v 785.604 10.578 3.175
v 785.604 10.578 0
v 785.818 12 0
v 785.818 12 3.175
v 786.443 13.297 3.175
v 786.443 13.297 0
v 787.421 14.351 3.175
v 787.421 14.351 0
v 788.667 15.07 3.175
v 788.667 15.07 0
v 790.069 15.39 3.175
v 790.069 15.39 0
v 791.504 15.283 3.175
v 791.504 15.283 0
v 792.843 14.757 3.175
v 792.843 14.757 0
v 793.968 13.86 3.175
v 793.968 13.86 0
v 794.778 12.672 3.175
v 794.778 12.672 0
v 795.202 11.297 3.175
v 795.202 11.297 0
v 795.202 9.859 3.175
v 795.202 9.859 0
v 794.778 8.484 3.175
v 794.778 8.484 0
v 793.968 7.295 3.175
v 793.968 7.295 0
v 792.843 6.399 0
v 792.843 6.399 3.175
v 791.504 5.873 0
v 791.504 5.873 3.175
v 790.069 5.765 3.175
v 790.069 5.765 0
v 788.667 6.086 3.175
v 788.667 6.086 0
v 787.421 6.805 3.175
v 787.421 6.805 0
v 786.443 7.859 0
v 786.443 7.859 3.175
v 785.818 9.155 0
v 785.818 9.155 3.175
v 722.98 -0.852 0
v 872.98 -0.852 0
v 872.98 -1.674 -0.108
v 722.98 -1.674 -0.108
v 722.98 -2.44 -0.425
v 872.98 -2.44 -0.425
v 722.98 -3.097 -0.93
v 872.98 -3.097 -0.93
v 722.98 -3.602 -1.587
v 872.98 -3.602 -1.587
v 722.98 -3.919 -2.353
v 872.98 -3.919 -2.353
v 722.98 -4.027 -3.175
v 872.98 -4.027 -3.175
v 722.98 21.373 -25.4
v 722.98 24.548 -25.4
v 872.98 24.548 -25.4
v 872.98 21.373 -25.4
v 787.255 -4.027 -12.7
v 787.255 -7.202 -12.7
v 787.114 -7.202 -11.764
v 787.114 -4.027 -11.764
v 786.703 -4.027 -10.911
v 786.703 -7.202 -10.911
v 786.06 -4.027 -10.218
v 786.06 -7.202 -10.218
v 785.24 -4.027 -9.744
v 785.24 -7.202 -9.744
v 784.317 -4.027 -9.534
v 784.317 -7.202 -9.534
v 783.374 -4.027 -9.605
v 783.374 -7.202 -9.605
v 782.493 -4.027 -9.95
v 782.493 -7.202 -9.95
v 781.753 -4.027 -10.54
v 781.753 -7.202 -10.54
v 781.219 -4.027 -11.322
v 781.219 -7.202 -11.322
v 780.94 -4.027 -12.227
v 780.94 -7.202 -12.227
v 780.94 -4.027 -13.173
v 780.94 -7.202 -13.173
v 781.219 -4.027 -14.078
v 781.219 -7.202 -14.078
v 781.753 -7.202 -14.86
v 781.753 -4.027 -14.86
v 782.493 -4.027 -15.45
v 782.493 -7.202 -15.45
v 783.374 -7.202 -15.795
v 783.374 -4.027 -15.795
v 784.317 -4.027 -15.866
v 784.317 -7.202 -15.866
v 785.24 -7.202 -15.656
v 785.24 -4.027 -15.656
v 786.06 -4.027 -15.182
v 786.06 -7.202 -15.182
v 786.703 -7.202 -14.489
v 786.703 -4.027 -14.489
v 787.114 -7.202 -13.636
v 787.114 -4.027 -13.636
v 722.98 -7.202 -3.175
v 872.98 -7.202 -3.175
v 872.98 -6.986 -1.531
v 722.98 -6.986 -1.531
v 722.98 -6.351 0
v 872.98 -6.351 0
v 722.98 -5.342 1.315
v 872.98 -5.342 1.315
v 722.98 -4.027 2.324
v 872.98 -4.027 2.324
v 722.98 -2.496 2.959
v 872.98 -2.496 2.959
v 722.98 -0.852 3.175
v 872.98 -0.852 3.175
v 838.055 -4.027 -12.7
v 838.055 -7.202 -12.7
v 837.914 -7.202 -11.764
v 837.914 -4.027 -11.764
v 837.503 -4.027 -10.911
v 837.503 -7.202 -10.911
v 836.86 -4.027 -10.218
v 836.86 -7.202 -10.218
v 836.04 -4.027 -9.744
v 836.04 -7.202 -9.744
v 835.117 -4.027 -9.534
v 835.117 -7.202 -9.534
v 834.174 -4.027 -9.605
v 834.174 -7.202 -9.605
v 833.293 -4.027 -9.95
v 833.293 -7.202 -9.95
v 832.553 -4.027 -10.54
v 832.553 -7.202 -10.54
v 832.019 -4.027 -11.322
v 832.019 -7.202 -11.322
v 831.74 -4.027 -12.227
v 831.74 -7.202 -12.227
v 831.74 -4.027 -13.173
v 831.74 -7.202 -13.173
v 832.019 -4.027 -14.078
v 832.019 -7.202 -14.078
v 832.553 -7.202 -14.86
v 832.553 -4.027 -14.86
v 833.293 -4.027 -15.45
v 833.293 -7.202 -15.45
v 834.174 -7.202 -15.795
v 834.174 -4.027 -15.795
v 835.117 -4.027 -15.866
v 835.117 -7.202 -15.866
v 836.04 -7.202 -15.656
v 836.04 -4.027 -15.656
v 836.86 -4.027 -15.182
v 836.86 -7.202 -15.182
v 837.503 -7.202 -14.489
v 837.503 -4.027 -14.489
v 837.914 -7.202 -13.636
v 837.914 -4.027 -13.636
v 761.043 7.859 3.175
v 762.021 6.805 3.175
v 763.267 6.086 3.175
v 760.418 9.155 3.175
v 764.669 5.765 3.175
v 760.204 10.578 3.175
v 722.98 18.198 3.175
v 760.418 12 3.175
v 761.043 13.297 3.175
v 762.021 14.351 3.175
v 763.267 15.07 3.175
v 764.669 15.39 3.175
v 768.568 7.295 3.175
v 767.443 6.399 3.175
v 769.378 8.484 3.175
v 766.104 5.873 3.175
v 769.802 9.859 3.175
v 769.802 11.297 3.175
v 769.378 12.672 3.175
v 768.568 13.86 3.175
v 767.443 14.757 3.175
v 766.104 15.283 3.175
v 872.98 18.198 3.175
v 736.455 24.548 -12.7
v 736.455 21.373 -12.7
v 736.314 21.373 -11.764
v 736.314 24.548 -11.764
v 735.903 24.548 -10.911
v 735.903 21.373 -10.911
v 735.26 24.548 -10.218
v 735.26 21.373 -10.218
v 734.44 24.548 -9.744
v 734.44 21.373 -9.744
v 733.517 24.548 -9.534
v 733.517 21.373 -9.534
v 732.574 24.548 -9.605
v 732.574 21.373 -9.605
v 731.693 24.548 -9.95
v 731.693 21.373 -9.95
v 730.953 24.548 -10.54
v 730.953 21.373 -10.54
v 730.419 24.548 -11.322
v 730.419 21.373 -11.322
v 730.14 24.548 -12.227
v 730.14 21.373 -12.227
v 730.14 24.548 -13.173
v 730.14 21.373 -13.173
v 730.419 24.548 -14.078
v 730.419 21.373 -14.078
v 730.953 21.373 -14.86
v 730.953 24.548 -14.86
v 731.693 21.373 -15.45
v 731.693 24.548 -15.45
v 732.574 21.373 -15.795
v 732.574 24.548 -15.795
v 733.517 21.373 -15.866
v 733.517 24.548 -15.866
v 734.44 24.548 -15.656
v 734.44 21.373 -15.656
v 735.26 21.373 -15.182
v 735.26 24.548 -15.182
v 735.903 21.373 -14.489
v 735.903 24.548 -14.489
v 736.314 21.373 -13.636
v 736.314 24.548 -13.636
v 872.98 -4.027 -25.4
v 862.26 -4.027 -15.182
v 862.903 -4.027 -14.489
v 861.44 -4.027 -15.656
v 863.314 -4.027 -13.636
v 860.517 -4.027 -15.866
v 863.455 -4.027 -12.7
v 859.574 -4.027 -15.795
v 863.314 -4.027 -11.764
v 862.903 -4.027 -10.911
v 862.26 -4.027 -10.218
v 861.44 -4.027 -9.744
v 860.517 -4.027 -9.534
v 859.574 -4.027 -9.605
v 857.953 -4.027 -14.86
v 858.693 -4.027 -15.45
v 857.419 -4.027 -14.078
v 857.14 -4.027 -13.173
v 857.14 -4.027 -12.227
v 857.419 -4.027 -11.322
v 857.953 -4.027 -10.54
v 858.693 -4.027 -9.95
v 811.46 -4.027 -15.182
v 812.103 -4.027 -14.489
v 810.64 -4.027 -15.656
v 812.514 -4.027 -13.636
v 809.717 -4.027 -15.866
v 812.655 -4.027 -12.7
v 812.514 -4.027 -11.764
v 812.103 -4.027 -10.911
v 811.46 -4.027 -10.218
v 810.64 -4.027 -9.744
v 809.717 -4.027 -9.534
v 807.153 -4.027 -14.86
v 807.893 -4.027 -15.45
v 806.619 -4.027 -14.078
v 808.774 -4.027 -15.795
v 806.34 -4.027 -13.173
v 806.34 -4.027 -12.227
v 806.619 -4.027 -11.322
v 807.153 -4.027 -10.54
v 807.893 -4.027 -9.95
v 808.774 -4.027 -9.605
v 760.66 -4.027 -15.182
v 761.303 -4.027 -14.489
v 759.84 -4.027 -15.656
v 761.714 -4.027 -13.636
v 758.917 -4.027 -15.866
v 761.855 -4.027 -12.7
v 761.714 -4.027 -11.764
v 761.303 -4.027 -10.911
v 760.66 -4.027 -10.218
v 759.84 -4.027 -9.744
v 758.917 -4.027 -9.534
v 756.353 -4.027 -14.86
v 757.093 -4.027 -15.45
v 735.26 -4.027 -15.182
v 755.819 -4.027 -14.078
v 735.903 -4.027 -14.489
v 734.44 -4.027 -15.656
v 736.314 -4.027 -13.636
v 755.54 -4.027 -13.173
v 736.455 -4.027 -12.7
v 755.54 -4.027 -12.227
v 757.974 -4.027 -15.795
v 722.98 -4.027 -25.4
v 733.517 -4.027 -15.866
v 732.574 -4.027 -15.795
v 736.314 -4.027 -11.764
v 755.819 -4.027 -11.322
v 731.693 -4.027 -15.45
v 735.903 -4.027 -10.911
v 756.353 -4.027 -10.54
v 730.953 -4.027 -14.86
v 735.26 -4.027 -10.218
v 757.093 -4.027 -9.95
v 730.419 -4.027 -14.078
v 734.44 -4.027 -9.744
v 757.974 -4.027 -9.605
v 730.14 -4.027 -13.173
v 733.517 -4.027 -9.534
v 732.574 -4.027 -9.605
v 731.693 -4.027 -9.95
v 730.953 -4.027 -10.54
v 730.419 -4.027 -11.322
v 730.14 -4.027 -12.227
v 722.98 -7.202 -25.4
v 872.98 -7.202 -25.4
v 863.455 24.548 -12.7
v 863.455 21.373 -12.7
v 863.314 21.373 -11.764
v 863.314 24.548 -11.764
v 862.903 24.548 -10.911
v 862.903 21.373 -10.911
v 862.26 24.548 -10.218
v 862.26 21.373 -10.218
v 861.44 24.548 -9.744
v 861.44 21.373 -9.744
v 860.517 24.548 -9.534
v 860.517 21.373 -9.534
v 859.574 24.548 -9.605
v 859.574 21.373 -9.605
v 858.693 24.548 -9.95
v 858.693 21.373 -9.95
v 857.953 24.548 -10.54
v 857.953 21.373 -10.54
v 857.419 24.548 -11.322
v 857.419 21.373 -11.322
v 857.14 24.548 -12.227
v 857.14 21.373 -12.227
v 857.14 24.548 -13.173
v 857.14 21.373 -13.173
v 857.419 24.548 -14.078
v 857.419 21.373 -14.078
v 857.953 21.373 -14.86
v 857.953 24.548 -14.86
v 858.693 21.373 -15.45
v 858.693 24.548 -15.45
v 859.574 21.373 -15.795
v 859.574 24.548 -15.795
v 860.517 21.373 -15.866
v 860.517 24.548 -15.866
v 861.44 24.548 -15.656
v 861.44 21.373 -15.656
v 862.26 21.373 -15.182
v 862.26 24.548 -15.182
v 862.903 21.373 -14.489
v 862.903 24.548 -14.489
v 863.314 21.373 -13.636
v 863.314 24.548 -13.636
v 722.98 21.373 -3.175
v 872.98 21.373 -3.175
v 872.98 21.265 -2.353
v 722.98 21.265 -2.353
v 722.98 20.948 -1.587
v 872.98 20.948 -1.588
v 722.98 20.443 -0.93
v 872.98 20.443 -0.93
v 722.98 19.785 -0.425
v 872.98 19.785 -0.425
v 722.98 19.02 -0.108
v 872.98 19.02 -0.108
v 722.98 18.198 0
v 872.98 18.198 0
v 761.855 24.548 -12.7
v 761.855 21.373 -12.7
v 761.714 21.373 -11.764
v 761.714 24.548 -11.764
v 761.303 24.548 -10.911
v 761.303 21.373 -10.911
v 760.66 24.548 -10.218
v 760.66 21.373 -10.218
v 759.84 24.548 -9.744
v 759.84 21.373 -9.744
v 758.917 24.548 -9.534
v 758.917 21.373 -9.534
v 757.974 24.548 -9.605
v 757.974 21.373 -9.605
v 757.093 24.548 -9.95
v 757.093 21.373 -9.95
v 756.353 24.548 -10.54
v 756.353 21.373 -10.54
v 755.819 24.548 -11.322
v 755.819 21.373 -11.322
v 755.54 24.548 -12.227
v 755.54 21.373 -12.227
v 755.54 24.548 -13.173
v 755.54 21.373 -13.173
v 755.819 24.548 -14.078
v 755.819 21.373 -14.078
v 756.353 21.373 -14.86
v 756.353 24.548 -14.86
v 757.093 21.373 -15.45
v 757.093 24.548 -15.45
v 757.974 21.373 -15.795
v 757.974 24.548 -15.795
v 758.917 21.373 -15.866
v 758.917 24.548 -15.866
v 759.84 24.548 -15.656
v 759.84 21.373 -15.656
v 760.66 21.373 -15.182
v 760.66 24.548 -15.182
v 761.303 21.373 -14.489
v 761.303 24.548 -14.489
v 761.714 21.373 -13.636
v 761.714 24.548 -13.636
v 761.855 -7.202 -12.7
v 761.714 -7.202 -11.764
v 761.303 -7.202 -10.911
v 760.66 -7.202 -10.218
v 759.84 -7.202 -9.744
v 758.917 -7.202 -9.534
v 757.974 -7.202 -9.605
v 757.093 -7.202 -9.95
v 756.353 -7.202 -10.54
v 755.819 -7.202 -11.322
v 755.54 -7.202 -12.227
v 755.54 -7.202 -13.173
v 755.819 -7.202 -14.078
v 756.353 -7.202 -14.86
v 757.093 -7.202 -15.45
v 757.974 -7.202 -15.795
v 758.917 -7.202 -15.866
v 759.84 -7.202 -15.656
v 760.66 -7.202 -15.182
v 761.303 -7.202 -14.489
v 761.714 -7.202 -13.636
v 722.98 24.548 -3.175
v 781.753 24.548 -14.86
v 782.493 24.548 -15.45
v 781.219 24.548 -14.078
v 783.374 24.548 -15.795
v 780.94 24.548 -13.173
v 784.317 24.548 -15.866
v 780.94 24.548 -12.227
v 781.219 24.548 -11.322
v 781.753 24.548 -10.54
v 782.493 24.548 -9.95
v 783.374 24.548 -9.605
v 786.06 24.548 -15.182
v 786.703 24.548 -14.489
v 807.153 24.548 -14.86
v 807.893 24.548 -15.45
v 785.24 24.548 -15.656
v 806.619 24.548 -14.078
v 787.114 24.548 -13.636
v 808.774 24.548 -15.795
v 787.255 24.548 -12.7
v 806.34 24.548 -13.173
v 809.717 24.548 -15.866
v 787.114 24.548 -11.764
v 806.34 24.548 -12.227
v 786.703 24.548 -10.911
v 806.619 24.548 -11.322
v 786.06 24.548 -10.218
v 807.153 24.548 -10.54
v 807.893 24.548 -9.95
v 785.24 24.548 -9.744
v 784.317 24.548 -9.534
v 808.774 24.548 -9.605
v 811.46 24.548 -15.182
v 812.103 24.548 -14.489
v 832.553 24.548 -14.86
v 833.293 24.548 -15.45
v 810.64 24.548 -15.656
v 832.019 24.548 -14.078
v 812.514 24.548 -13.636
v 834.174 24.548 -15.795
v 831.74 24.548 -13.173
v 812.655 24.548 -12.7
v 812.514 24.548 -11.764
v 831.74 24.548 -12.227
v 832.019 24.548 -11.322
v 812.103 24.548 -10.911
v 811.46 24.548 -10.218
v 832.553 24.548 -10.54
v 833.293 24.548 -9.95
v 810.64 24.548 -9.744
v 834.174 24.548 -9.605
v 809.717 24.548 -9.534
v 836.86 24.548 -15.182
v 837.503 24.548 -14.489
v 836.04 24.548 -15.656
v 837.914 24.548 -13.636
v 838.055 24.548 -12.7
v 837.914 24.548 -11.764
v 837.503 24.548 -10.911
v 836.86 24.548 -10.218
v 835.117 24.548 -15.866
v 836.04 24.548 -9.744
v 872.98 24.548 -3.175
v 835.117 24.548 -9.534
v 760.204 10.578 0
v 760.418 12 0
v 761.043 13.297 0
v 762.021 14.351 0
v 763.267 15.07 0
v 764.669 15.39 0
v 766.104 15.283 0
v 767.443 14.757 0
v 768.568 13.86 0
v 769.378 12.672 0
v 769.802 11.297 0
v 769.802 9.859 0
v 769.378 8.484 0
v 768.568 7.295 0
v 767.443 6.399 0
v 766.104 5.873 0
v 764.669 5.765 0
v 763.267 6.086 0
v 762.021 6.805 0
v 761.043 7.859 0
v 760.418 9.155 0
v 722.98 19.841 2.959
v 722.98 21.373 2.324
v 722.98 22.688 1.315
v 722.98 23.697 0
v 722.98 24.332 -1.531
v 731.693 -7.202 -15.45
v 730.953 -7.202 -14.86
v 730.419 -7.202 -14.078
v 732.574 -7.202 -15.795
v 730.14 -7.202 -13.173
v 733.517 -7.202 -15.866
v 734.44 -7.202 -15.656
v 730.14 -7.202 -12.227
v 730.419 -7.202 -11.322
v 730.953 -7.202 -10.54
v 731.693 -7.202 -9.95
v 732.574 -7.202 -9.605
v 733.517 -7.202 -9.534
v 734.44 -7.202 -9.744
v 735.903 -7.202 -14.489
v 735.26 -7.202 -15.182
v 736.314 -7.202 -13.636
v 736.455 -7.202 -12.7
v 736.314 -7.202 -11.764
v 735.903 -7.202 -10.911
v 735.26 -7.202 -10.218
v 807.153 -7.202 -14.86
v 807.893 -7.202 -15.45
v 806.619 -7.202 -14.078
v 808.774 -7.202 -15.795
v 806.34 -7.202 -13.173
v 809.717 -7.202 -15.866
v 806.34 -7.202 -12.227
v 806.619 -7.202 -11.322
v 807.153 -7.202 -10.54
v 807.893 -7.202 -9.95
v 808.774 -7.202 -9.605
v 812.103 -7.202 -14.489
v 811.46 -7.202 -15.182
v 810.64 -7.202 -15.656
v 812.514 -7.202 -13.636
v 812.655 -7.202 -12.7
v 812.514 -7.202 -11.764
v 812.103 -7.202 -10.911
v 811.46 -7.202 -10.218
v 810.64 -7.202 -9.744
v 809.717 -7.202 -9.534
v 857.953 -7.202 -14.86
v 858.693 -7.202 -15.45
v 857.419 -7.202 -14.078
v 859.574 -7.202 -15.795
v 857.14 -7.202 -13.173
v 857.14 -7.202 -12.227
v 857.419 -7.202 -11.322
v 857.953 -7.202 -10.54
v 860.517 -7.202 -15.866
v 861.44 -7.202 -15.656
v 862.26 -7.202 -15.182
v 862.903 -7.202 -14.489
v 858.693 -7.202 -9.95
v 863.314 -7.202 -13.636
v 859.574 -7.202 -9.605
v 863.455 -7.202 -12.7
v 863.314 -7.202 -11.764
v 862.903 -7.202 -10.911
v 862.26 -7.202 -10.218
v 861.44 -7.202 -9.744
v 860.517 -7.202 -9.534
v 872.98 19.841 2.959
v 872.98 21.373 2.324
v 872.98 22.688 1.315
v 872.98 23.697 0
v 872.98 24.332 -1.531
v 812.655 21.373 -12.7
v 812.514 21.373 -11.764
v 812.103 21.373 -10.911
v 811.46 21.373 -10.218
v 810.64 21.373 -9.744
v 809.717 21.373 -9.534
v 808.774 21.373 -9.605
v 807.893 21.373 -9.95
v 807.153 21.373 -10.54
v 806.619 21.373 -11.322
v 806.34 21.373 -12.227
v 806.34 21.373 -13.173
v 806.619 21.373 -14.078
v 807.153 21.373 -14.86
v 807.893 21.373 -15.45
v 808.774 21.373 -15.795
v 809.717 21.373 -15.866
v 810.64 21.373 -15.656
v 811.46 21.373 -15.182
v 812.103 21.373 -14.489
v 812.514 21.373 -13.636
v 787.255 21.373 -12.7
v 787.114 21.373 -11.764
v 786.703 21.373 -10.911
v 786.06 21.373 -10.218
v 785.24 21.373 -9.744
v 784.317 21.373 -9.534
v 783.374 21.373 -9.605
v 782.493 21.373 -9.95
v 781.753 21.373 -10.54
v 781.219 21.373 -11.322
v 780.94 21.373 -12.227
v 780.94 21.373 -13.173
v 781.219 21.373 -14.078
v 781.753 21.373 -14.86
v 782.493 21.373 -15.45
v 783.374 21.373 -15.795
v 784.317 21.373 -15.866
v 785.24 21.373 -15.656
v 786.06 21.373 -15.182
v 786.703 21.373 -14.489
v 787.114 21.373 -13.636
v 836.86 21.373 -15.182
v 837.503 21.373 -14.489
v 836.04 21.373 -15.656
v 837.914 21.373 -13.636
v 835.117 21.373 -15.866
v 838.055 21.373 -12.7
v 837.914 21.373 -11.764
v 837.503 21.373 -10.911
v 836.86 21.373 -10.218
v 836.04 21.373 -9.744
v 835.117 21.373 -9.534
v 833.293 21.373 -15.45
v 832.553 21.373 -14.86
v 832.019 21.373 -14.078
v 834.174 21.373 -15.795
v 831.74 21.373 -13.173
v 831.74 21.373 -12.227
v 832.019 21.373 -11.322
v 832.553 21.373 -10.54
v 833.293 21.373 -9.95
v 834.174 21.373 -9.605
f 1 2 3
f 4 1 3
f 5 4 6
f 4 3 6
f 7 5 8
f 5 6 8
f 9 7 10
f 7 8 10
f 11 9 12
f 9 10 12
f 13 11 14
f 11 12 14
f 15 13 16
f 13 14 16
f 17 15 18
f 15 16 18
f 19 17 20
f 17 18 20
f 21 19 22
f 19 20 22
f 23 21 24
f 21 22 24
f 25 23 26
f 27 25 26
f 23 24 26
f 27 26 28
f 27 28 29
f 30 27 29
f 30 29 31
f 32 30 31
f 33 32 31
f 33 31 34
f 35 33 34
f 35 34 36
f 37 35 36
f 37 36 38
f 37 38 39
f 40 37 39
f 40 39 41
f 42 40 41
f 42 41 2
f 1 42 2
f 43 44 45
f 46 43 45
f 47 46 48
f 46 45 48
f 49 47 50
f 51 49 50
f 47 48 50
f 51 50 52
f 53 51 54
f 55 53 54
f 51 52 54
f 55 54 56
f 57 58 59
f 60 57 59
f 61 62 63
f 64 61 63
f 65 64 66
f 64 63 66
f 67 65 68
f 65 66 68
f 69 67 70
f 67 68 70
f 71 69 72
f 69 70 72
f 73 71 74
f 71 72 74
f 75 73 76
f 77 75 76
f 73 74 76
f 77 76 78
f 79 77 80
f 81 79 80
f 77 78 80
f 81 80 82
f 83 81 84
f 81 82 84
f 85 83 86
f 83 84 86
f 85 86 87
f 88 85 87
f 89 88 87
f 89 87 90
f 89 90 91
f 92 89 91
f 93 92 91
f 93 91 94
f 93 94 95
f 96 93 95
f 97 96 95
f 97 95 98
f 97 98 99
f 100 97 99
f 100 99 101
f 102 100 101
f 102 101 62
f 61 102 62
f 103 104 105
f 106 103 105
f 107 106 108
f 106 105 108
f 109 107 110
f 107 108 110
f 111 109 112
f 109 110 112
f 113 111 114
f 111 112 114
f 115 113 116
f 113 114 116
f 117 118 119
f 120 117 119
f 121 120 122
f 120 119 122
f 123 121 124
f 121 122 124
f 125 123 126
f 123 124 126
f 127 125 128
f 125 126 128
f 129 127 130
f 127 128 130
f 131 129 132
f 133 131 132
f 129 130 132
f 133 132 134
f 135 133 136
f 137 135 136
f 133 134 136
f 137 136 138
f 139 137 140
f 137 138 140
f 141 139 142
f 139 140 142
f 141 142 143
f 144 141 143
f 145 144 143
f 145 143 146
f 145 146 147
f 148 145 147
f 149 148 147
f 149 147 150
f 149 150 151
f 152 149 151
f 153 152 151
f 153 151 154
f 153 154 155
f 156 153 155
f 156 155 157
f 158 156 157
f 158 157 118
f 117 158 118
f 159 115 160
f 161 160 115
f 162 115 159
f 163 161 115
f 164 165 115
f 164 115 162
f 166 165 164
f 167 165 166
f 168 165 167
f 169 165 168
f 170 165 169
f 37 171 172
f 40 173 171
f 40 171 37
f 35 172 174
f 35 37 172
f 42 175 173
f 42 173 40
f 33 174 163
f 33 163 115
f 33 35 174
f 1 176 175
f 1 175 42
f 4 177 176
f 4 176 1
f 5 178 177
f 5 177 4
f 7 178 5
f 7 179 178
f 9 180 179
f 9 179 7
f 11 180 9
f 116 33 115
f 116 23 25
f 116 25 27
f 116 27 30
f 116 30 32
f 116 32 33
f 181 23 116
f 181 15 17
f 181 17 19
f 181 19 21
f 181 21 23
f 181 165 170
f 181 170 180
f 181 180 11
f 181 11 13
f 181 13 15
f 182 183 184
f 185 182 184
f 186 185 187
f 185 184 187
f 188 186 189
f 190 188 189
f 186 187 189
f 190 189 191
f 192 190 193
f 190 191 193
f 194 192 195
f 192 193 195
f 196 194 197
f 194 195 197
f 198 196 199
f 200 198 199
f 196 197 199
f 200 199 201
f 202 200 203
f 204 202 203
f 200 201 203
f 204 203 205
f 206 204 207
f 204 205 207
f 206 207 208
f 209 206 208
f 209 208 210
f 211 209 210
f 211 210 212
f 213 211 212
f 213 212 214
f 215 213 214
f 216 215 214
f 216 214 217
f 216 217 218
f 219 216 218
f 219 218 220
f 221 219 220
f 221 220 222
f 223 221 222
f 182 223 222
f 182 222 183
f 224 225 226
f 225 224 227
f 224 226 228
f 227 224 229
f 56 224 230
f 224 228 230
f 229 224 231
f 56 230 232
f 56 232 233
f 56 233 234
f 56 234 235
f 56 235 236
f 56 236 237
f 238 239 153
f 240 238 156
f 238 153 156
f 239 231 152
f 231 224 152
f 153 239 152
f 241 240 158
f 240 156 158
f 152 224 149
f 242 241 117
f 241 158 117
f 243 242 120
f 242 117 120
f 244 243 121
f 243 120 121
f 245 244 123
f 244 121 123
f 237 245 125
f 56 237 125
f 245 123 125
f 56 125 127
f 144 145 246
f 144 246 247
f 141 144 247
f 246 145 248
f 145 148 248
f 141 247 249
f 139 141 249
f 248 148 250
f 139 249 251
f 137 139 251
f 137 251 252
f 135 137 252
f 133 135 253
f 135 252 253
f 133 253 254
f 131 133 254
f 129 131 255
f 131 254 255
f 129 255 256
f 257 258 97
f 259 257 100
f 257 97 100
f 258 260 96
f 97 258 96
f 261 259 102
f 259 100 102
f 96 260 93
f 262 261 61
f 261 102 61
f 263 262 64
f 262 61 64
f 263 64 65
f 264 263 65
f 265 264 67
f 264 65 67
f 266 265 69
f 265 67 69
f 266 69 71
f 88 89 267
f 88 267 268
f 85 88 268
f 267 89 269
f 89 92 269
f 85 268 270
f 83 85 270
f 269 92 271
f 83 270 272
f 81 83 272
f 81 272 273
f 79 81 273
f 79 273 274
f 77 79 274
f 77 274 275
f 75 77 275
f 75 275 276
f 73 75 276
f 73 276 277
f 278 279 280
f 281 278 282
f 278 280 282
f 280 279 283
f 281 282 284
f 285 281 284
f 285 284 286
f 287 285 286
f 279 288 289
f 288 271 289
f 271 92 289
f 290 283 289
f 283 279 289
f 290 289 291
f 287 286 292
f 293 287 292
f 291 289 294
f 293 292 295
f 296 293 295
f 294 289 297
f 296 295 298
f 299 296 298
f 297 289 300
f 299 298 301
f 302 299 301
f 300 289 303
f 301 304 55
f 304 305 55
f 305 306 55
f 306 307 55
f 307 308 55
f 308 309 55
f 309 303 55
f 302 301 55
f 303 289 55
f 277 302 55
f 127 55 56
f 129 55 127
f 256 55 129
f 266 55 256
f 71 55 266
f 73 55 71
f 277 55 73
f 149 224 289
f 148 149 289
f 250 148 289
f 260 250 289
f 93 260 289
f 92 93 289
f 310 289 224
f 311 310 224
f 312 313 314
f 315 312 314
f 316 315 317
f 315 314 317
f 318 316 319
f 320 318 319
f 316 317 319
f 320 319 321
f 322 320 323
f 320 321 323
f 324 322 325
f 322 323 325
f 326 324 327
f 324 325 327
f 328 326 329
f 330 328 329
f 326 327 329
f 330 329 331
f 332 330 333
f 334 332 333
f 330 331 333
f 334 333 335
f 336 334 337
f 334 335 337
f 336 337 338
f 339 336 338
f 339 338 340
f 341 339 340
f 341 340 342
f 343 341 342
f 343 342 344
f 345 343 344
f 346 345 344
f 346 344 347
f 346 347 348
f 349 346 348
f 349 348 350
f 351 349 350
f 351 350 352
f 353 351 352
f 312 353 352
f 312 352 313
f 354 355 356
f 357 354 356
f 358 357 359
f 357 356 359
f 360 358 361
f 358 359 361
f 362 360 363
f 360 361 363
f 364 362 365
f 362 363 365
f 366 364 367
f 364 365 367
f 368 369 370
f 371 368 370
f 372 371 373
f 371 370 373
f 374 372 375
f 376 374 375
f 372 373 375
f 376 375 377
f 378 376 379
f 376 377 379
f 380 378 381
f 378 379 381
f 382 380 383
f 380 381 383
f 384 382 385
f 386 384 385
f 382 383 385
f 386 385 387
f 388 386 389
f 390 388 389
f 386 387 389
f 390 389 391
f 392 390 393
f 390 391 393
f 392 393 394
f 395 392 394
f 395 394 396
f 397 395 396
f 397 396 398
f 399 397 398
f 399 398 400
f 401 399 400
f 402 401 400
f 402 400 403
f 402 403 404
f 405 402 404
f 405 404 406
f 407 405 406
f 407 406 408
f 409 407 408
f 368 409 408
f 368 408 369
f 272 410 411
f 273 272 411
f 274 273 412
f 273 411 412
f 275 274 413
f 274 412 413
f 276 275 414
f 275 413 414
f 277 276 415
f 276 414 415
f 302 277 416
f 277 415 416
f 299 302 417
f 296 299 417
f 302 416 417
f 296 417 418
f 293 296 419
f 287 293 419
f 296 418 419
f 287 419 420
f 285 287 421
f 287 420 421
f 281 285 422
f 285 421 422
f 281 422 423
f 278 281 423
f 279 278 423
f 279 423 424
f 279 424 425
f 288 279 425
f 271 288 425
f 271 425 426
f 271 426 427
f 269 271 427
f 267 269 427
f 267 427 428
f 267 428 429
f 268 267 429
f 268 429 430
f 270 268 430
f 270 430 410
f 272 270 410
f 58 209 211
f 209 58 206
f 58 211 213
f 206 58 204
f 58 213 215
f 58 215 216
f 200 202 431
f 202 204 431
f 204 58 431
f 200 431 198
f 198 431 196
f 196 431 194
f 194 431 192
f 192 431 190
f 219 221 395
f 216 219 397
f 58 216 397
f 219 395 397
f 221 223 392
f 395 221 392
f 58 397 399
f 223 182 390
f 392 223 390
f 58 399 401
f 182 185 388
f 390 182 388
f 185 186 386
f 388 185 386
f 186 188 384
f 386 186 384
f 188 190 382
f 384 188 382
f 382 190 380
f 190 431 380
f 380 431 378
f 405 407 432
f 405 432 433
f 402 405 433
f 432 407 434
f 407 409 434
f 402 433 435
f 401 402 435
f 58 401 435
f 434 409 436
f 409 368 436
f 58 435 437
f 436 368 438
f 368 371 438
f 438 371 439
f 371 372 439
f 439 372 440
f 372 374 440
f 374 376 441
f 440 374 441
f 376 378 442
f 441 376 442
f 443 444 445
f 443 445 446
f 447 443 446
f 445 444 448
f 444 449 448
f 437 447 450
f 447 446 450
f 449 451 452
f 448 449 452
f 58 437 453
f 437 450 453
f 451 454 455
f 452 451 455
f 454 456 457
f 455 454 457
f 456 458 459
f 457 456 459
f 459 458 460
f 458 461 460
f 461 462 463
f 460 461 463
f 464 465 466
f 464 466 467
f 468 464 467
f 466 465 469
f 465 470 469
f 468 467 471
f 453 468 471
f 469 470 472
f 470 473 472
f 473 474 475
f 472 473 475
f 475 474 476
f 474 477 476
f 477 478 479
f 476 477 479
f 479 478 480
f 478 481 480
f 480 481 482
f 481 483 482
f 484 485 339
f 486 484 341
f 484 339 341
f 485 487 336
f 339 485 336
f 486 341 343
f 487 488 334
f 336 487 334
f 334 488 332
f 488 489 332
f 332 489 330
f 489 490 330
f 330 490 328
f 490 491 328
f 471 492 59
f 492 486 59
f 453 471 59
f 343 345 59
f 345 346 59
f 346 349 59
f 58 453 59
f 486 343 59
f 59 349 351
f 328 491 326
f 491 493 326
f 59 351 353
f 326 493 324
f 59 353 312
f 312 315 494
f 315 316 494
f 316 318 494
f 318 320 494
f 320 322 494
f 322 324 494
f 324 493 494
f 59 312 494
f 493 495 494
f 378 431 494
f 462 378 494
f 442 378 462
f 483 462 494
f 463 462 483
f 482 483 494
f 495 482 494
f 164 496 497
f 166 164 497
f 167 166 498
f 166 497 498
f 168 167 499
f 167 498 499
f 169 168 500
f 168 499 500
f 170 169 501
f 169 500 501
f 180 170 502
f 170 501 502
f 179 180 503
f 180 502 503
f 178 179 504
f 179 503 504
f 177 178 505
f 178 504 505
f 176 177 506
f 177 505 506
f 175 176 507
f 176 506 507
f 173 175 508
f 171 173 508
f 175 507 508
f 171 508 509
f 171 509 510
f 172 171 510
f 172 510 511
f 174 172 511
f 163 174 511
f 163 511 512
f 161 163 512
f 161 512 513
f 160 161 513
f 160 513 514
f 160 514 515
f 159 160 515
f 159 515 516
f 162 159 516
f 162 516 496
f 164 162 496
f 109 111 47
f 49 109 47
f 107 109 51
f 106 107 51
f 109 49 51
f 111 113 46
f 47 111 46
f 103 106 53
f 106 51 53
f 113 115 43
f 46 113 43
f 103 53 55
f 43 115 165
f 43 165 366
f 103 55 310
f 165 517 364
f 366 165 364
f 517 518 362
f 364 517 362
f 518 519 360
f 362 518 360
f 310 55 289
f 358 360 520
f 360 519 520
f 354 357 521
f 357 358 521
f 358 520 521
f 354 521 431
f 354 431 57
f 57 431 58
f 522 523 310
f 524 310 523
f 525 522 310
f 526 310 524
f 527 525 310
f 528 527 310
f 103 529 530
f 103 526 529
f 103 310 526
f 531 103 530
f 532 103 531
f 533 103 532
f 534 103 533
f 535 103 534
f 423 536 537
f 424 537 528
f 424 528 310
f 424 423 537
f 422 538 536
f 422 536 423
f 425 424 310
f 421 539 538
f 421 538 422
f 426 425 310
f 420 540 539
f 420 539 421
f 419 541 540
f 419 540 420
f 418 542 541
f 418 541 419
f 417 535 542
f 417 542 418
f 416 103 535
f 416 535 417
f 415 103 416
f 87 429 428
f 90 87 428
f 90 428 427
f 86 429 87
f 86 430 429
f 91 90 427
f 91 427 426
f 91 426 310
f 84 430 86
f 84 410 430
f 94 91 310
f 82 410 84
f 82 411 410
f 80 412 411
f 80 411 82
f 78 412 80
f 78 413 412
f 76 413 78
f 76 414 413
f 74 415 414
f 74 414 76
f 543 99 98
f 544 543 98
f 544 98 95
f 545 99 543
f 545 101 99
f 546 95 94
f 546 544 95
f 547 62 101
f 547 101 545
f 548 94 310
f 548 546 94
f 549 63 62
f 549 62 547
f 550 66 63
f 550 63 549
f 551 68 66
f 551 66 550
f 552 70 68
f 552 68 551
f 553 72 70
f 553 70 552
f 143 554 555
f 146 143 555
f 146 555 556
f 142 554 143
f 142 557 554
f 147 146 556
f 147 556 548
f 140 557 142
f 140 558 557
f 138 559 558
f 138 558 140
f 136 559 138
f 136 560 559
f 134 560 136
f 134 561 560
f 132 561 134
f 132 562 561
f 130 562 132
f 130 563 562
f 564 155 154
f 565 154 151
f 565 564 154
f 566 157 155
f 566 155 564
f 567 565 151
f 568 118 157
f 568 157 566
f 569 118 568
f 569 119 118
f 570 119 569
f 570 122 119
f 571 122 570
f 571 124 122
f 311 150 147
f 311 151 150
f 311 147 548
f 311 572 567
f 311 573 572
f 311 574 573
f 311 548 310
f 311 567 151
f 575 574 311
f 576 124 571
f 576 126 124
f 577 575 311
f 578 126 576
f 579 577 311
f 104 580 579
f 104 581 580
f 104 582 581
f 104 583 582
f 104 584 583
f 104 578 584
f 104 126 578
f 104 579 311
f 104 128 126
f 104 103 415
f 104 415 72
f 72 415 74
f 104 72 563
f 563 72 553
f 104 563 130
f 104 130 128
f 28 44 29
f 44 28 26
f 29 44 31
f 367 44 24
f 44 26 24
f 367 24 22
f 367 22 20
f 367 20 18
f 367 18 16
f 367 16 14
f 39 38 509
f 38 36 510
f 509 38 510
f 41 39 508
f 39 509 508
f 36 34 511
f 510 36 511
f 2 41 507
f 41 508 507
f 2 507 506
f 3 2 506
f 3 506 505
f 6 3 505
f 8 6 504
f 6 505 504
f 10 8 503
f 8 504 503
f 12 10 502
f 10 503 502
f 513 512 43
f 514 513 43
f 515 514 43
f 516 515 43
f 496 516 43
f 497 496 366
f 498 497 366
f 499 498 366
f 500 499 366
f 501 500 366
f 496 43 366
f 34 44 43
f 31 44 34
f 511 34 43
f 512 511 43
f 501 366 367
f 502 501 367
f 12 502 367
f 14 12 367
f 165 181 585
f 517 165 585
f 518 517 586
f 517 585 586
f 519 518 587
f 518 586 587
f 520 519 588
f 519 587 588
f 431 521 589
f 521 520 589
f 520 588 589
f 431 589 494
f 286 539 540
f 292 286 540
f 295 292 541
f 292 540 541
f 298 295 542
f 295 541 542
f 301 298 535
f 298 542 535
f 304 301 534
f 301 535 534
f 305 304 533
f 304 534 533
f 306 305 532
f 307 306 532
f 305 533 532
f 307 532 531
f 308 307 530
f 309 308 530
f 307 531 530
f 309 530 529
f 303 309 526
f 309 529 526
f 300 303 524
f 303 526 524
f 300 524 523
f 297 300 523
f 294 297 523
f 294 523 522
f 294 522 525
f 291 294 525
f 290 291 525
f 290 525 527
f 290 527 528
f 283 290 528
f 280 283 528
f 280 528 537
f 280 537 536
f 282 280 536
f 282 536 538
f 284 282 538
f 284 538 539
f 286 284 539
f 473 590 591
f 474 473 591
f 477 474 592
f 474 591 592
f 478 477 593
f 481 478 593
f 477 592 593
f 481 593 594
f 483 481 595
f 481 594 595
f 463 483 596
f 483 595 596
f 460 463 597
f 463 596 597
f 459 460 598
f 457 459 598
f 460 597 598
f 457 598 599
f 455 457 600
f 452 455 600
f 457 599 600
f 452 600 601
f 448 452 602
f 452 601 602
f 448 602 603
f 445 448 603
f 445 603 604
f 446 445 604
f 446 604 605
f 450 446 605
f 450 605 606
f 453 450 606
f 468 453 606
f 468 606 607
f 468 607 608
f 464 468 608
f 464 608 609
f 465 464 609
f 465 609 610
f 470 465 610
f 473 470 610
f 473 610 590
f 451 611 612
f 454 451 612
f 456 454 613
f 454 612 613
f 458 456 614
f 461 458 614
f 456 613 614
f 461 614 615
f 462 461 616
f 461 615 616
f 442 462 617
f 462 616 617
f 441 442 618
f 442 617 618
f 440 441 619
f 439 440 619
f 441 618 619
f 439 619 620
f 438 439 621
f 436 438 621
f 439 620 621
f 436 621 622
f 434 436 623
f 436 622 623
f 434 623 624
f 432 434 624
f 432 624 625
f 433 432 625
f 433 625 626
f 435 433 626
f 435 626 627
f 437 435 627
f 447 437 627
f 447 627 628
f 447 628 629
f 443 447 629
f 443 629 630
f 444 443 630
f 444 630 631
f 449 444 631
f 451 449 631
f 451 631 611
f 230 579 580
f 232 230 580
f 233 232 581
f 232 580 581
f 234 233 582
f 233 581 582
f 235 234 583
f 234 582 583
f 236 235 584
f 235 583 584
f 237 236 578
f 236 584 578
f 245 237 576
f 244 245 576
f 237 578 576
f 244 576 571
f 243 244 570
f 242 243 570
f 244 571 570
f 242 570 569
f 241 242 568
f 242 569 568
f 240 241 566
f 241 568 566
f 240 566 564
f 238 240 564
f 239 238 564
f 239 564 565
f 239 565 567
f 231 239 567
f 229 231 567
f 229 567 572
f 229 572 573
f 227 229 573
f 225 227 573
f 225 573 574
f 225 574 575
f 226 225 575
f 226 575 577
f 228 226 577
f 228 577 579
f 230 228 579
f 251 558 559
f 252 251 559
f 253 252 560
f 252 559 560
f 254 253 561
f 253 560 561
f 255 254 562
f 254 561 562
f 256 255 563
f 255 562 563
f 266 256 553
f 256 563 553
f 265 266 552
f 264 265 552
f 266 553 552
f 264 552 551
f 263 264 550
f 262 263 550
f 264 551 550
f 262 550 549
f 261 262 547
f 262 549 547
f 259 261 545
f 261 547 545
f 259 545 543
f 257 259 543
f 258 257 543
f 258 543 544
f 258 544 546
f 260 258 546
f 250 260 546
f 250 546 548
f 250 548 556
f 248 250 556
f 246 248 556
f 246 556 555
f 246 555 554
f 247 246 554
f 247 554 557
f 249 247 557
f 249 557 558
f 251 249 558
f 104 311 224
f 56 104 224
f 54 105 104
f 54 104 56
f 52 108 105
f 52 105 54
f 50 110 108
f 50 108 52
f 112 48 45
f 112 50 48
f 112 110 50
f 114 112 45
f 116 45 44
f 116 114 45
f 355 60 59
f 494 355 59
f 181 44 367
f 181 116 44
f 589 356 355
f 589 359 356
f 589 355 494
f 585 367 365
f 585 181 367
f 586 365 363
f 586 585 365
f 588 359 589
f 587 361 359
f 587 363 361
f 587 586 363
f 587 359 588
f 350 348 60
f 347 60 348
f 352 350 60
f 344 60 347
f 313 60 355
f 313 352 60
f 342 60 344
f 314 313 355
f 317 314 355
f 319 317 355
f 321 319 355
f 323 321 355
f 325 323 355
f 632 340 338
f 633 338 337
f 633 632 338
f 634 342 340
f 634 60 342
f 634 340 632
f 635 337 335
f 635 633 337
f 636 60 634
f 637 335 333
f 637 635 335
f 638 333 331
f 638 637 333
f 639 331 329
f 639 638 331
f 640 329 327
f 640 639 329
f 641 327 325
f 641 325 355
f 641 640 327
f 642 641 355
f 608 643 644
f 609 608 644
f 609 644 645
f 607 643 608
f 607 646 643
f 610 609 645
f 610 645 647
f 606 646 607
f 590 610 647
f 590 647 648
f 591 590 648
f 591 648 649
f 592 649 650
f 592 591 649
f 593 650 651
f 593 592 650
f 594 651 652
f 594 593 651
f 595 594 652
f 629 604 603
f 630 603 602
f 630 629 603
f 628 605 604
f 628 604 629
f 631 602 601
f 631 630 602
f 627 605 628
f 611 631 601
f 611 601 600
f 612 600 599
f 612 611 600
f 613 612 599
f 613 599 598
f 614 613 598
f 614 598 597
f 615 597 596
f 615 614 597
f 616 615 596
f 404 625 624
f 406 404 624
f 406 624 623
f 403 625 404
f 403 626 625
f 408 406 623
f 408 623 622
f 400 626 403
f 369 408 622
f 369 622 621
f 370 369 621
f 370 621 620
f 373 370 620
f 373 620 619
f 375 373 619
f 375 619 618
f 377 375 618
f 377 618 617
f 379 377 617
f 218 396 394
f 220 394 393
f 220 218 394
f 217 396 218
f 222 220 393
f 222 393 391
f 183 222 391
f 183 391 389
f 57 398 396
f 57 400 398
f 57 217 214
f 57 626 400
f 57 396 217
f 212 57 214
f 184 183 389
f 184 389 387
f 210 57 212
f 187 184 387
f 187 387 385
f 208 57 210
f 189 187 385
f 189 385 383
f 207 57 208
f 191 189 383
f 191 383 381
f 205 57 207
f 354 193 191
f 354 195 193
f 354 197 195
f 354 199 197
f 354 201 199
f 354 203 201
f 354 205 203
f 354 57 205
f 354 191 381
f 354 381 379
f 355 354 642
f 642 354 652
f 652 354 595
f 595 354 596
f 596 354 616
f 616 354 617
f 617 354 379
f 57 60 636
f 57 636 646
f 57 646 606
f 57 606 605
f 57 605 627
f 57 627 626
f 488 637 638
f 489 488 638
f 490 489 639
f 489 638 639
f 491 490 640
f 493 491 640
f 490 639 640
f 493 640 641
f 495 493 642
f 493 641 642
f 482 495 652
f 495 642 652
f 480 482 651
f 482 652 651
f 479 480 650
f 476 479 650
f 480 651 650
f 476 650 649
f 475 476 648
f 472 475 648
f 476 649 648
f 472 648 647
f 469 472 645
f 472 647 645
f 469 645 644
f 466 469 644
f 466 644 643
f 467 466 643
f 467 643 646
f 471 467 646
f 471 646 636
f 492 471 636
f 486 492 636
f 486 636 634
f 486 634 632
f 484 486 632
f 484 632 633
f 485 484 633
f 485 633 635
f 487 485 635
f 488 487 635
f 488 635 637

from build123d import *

# Parameters (mm, degrees)
SKETCH1_W               = 889
SKETCH1_H               = 31.75
EXTRUDE1_DEPTH          = 28.575
EXTRUDE2_REACH          = 891.702
SKETCH2_W               = 25.4
SKETCH2_H               = 25.4
HOLE1_D                 = 6.35
HOLE1_DEPTH             = 3.175
LPATTERN1_COUNT         = 35
LPATTERN1_PITCH         = 25.4
HOLE2_D                 = 9.652
LPATTERN2_COUNT         = 12
LPATTERN2_PITCH         = 25.4
HOLE3_D                 = 9.652
HOLE4_D                 = 9.652
LPATTERN3_COUNT         = 12
LPATTERN3_PITCH         = 25.4
HOLE5_D                 = 3.175
HOLE6_D                 = 6.35
LPATTERN4_COUNT         = 35
LPATTERN4_PITCH         = 25.4
FILLET1_R               = 3.175
FILLET2_R               = 3.175
FILLET3_R               = 6.35
FILLET4_R               = 6.35
CUT_EXTRUDE4_DEPTH      = 77
CUT_EXTRUDE4_DEPTH_BACK = 92
SKETCH15_W              = 799.570911011
SKETCH15_H              = 54.502378411
SKETCH15_R              = 3.175


with BuildPart() as part:
    # Sketch1 → Extrude1 (new body)
    with BuildSketch(Plane.XY.offset(3.175)):
        with Locations((428.480011997, 8.672957166)):
            Rectangle(SKETCH1_W, SKETCH1_H)
    extrude(amount=-EXTRUDE1_DEPTH)

    # Sketch2 → Extrude2 (cut, up to next)
    with BuildSketch(Plane.ZY.offset(16.019988003), mode=Mode.PRIVATE) as extrude2_sk1:
        with Locations((-12.7, 8.672957166)):
            Rectangle(SKETCH2_W, SKETCH2_H)
    extrude2_tool1 = extrude(extrude2_sk1.sketch, amount=-EXTRUDE2_REACH, mode=Mode.PRIVATE) & part.part
    add(extrude2_tool1.solids().sort_by_distance((-16.019988, 8.672957, -12.7))[0], mode=Mode.SUBTRACT)

    # Hole1
    with Locations(Plane(origin=(0, 24.547957166, 0), x_dir=(-1, 0, 0), z_dir=(0, 1, 0))):
        with Locations((3.319988003, -12.7)):
            hole1 = Hole(HOLE1_D / 2, depth=HOLE1_DEPTH)

    # LPattern1: Hole1 ×35
    with Locations(*[(i * LPATTERN1_PITCH, 0, 0) for i in range(1, LPATTERN1_COUNT)]):
        add(hole1, mode=Mode.SUBTRACT)

    # Hole2 (through all)
    with Locations(Plane.XY.offset(3.175)):
        with Locations((66.530011997, 10.577957166)):
            hole2 = Hole(HOLE2_D / 2)

    # LPattern2: Hole2 ×12, 8 skipped
    with Locations(*[(i * LPATTERN2_PITCH, 0, 0) for i in range(1, LPATTERN2_COUNT) if i not in (2, 3, 4, 5, 6, 7, 8, 9)]):
        add(hole2, mode=Mode.SUBTRACT)

    # Hole3 (through all)
    with Locations(Plane.XY.offset(3.175)):
        with Locations((428.480011997, 6.767957166)):
            Hole(HOLE3_D / 2)

    # Hole4 (through all)
    with Locations(Plane.XY.offset(3.175)):
        with Locations((511.030011997, 10.577957166)):
            hole4 = Hole(HOLE4_D / 2)

    # LPattern3: Hole4 ×12, 8 skipped
    with Locations(*[(i * LPATTERN3_PITCH, 0, 0) for i in range(1, LPATTERN3_COUNT) if i not in (2, 3, 4, 5, 6, 7, 8, 9)]):
        add(hole4, mode=Mode.SUBTRACT)

    # Hole5 (through all)
    with Locations(Plane.XY.offset(3.175)):
        with Locations((669.780011997, 8.672957166)):
            Hole(HOLE5_D / 2)

    # Hole6 (through all)
    with Locations(Plane(origin=(0, -4.027042834, 0), x_dir=(-1, 0, 0), z_dir=(0, 1, 0))):
        with Locations((3.319988003, -12.7)):
            hole6 = Hole(HOLE6_D / 2)

    # LPattern4: Hole6 ×35
    with Locations(*[(i * LPATTERN4_PITCH, 0, 0) for i in range(1, LPATTERN4_COUNT)]):
        add(hole6, mode=Mode.SUBTRACT)

    # Fillet1
    fillet1_edges = [part.edges().sort_by_distance(p)[0] for p in [
        (428.480011997, 21.372957166, 0),
    ]]
    fillet(fillet1_edges, radius=FILLET1_R)

    # Fillet2
    fillet2_edges = [part.edges().sort_by_distance(p)[0] for p in [
        (428.480011997, -4.027042834, 0),
    ]]
    fillet(fillet2_edges, radius=FILLET2_R)

    # Fillet3
    fillet3_edges = [part.edges().sort_by_distance(p)[0] for p in [
        (428.480011997, -7.202042834, 3.175),
    ]]
    fillet(fillet3_edges, radius=FILLET3_R)

    # Fillet4
    fillet4_edges = [part.edges().sort_by_distance(p)[0] for p in [
        (428.480011997, 24.547957166, 3.175),
    ]]
    fillet(fillet4_edges, radius=FILLET4_R)

    # Sketch15 → Cut-Extrude4 (cut, two sides: drawn at the far end of the back side and taken through both)
    with BuildSketch(Plane(origin=(0, 24.547957166, 0), x_dir=(1, 0, 0), z_dir=(0, 1, 0)).offset(-CUT_EXTRUDE4_DEPTH_BACK)):
        with Locations((323.194556492, -1.851189205)):
            Rectangle(SKETCH15_W, SKETCH15_H)
        with Locations((-3.319988003, 12.7)):
            Circle(SKETCH15_R, mode=Mode.SUBTRACT)
        with Locations((47.480011997, 12.7)):
            Circle(SKETCH15_R, mode=Mode.SUBTRACT)
        with Locations((98.280011997, 12.7)):
            Circle(SKETCH15_R, mode=Mode.SUBTRACT)
        with Locations((149.080011997, 12.7)):
            Circle(SKETCH15_R, mode=Mode.SUBTRACT)
        with Locations((199.880011997, 12.7)):
            Circle(SKETCH15_R, mode=Mode.SUBTRACT)
        with Locations((250.680011997, 12.7)):
            Circle(SKETCH15_R, mode=Mode.SUBTRACT)
        with Locations((301.480011997, 12.7)):
            Circle(SKETCH15_R, mode=Mode.SUBTRACT)
        with Locations((326.880011997, 12.7)):
            Circle(SKETCH15_R, mode=Mode.SUBTRACT)
        with Locations((352.280011997, 12.7)):
            Circle(SKETCH15_R, mode=Mode.SUBTRACT)
        with Locations((377.680011997, 12.7)):
            Circle(SKETCH15_R, mode=Mode.SUBTRACT)
        with Locations((403.080011997, 12.7)):
            Circle(SKETCH15_R, mode=Mode.SUBTRACT)
        with Locations((428.480011997, 12.7)):
            Circle(SKETCH15_R, mode=Mode.SUBTRACT)
        with Locations((453.880011997, 12.7)):
            Circle(SKETCH15_R, mode=Mode.SUBTRACT)
        with Locations((479.280011997, 12.7)):
            Circle(SKETCH15_R, mode=Mode.SUBTRACT)
        with Locations((504.680011997, 12.7)):
            Circle(SKETCH15_R, mode=Mode.SUBTRACT)
        with Locations((530.080011997, 12.7)):
            Circle(SKETCH15_R, mode=Mode.SUBTRACT)
        with Locations((555.480011997, 12.7)):
            Circle(SKETCH15_R, mode=Mode.SUBTRACT)
        with Locations((580.880011997, 12.7)):
            Circle(SKETCH15_R, mode=Mode.SUBTRACT)
        with Locations((606.280011997, 12.7)):
            Circle(SKETCH15_R, mode=Mode.SUBTRACT)
        with Locations((631.680011997, 12.7)):
            Circle(SKETCH15_R, mode=Mode.SUBTRACT)
        with Locations((657.080011997, 12.7)):
            Circle(SKETCH15_R, mode=Mode.SUBTRACT)
        with Locations((682.480011997, 12.7)):
            Circle(SKETCH15_R, mode=Mode.SUBTRACT)
        with Locations((707.880011997, 12.7)):
            Circle(SKETCH15_R, mode=Mode.SUBTRACT)
    extrude(amount=CUT_EXTRUDE4_DEPTH + CUT_EXTRUDE4_DEPTH_BACK, mode=Mode.SUBTRACT)


solid = part.part
